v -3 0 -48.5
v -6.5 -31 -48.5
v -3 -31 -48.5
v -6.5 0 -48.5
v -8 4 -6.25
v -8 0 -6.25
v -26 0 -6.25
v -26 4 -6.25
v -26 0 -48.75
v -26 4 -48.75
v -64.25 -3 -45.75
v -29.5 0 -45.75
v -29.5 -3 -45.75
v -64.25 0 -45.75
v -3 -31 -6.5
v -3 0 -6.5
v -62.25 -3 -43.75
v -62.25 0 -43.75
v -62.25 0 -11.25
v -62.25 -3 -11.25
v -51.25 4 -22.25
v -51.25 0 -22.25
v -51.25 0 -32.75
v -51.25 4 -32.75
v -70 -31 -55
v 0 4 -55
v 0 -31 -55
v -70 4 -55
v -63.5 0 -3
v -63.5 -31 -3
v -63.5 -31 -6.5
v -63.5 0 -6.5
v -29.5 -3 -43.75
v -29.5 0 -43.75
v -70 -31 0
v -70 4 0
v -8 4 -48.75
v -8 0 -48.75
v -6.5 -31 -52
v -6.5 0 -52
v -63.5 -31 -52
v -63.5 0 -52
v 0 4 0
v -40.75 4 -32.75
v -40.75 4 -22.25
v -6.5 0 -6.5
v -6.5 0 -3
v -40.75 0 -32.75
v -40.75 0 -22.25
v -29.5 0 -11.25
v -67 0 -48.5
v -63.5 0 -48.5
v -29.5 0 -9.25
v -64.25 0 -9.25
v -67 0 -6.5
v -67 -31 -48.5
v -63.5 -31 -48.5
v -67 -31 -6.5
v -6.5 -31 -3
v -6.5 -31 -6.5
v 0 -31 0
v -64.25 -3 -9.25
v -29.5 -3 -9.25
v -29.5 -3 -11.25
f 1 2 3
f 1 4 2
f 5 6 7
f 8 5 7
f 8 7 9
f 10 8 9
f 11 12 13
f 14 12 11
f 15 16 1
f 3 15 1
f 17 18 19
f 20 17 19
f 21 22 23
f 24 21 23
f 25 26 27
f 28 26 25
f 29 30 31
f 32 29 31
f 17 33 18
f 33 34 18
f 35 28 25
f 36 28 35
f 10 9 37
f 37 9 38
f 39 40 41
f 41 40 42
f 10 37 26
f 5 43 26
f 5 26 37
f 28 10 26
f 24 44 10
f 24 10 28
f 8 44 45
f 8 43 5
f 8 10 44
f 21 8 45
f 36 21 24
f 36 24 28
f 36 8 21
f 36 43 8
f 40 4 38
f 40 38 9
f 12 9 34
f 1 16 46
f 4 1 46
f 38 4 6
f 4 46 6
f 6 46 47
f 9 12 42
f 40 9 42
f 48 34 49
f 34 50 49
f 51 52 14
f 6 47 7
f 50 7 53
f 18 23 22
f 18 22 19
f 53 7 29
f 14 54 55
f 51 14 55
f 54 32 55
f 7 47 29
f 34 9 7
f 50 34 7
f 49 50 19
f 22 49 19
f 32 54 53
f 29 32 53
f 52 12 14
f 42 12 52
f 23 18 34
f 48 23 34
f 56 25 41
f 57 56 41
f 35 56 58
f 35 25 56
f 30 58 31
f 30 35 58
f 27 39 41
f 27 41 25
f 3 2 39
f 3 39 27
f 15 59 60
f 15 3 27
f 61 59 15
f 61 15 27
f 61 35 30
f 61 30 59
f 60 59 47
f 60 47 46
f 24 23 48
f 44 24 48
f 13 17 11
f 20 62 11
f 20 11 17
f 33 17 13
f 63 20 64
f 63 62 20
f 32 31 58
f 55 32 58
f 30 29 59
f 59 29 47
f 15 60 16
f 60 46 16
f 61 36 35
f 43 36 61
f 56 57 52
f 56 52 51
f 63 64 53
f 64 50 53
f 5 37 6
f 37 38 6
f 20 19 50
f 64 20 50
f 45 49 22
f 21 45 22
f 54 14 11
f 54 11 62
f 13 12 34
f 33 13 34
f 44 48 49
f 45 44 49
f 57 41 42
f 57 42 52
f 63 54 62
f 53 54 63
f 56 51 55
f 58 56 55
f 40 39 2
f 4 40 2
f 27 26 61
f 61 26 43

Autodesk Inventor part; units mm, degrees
ref_plane "YZ Plane" through (0, 0, 0) normal (1, 0, 0) x (0, 1, 0)
ref_plane "XZ Plane" through (0, 0, 0) normal (0, 1, 0) x (-1, 0, 0)
ref_plane "XY Plane" through (0, 0, 0) normal (0, 0, 1) x (1, 0, 0)
sketch "Sketch1" plane through (0, 0, 0) normal (0, 1, 0) x (-1, 0, 0)
  line L0 (0, 0) -> (70, 0)
  line L1 (70, 0) -> (70, -55)
  line L2 (70, -55) -> (0, -55)
  line L3 (0, -55) -> (0, 0)
  line L4 (51.25, -32.75) -> (40.75, -32.75)
  line L5 (40.75, -32.75) -> (40.75, -22.25)
  line L6 (40.75, -22.25) -> (51.25, -22.25)
  line L7 (51.25, -22.25) -> (51.25, -32.75)
  line L8 (26, -48.75) -> (8, -48.75)
  line L9 (8, -48.75) -> (8, -6.25)
  line L10 (8, -6.25) -> (26, -6.25)
  line L11 (26, -6.25) -> (26, -48.75)
  dimension "d0" = 70
  dimension "d1" = 55
  dimension "d2" = 10.5
  dimension "d3" = 10.5
  dimension "d4" = 18
  dimension "d5" = 42.5
  dimension "d6" = 6.25
  dimension "d7" = 22.25
  dimension "d8" = 8
  dimension "d9" = 18.75
extrude "Extrusion1" add sketch "Sketch1" along normal blind 4
sketch "Sketch2" plane through (0, 0, 0) normal (0, -1, 0) x (1, 0, 0)
  line L0 (0, 0) -> (0, -55) projected
  line L1 (-70, 0) -> (0, 0) projected
  line L2 (0, -55) -> (-70, -55)
  line L3 (-70, -55) -> (-70, 0)
  line L4 (-70, 0) -> (0, 0)
  line L5 (0, 0) -> (0, -55)
  line L6 (-3, -52) -> (-67, -52)
  line L7 (-67, -52) -> (-67, -3)
  line L8 (-67, -3) -> (-3, -3)
  line L9 (-3, -3) -> (-3, -52)
  line L10 (-29.5, -43.75) -> (-62.25, -43.75)
  line L11 (-62.25, -43.75) -> (-62.25, -11.25)
  line L12 (-62.25, -11.25) -> (-29.5, -11.25)
  line L13 (-40.75, -32.75) -> (-51.25, -32.75) projected
  line L14 (-51.25, -22.25) -> (-40.75, -22.25) projected
  line L15 (-51.25, -32.75) -> (-51.25, -22.25) projected
  line L16 (-40.75, -22.25) -> (-40.75, -32.75) projected
  line L17 (-29.5, -45.75) -> (-64.25, -45.75)
  line L18 (-64.25, -45.75) -> (-64.25, -9.25)
  line L19 (-64.25, -9.25) -> (-29.5, -9.25)
  line L20 (-29.5, -45.75) -> (-29.5, -43.75)
  line L21 (-29.5, -11.25) -> (-29.5, -9.25)
  dimension "d14" = 3
  dimension "d15" = 3
  dimension "d16" = 3
  dimension "d17" = 3
  dimension "d18" = 32.75
  dimension "d19" = 11
  dimension "d20" = 11
  dimension "d21" = 11
  dimension "d23" = 2
  dimension "d24" = 2
  dimension "d25" = 2
extrude "Extrusion2" add sketch "Sketch2" along normal blind 3 contours L20 L17 L18 L19 L21 L12 L11 L10
sketch "Sketch3" plane through (0, 0, 0) normal (0, -1, 0) x (1, 0, 0)
  line L0 (0, -55) -> (0, 0) projected
  line L1 (0, -55) -> (-70, -55)
  line L2 (-70, -55) -> (-70, 0)
  line L3 (-70, 0) -> (0, 0)
  line L4 (0, 0) -> (0, -55)
  line L5 (-3, -52) -> (-67, -52)
  line L6 (-67, -52) -> (-67, -3)
  line L7 (-67, -3) -> (-3, -3)
  line L8 (-3, -3) -> (-3, -52)
  dimension "d28" = 3
  dimension "d29" = 3
  dimension "d30" = 3
  dimension "d31" = 3
extrude "Extrusion3" add sketch "Sketch3" along normal blind 31
sketch "Sketch4" plane through (0, 0, 0) normal (0, -1, 0) x (1, 0, 0)
  line L0 (-3, -52) -> (-6.5, -52)
  line L1 (-6.5, -52) -> (-6.5, -48.5)
  line L2 (-6.5, -48.5) -> (-3, -48.5)
  line L3 (-3, -48.5) -> (-3, -52)
  line L4 (-3, -6.5116) -> (-3, -3.0116)
  line L5 (-67, -3) -> (-67, -52) projected
  line L6 (-67, -52) -> (-63.5, -52)
  line L7 (-63.5, -52) -> (-63.5, -48.5)
  line L8 (-63.5, -48.5) -> (-67, -48.5)
  line L9 (-67, -48.5) -> (-67, -52)
  line L10 (-67, -3) -> (-63.5, -3)
  line L11 (-63.5, -3) -> (-63.5, -6.5)
  line L12 (-63.5, -6.5) -> (-67, -6.5)
  line L13 (-67, -6.5) -> (-67, -3)
  line L14 (-3, -3) -> (-3, -52) projected
  line L15 (-3, -3) -> (-6.5, -3)
  line L16 (-6.5, -3) -> (-6.5, -6.5)
  line L17 (-6.5, -6.5) -> (-3, -6.5)
  line L18 (-3, -6.5) -> (-3, -3)
  point P0 (0, 0)
  dimension "d34" = 3.5
  dimension "d35" = 3.5
  dimension "d38" = 3.5
  dimension "d39" = 3.5
  dimension "d40" = 3.5
  dimension "d41" = 3.5
  dimension "d42" = 3.5
  dimension "d43" = 3.5
extrude "Extrusion4" add sketch "Sketch4" along normal blind 31
sketch "Sketch5" plane through (0, 4, 0) normal (1, 0, 0) x (0, 0, -1)
  line L0 (48.75, -16) -> (6.25, -16)
  line L1 (6.25, -16) -> (6.25, -35)
  line L2 (6.25, -35) -> (48.75, -35)
  line L3 (48.75, -35) -> (48.75, -16)
  line L4 (0, 0) -> (55, 0) projected
  line L5 (55, 0) -> (55, -35) projected
  point P0 (0, -4)
  dimension "d46" = 42.5
  dimension "d47" = 19
  dimension "d48" = 16
  dimension "d49" = 6.25
properties part number "test_camAndultra_sideprofiles"
